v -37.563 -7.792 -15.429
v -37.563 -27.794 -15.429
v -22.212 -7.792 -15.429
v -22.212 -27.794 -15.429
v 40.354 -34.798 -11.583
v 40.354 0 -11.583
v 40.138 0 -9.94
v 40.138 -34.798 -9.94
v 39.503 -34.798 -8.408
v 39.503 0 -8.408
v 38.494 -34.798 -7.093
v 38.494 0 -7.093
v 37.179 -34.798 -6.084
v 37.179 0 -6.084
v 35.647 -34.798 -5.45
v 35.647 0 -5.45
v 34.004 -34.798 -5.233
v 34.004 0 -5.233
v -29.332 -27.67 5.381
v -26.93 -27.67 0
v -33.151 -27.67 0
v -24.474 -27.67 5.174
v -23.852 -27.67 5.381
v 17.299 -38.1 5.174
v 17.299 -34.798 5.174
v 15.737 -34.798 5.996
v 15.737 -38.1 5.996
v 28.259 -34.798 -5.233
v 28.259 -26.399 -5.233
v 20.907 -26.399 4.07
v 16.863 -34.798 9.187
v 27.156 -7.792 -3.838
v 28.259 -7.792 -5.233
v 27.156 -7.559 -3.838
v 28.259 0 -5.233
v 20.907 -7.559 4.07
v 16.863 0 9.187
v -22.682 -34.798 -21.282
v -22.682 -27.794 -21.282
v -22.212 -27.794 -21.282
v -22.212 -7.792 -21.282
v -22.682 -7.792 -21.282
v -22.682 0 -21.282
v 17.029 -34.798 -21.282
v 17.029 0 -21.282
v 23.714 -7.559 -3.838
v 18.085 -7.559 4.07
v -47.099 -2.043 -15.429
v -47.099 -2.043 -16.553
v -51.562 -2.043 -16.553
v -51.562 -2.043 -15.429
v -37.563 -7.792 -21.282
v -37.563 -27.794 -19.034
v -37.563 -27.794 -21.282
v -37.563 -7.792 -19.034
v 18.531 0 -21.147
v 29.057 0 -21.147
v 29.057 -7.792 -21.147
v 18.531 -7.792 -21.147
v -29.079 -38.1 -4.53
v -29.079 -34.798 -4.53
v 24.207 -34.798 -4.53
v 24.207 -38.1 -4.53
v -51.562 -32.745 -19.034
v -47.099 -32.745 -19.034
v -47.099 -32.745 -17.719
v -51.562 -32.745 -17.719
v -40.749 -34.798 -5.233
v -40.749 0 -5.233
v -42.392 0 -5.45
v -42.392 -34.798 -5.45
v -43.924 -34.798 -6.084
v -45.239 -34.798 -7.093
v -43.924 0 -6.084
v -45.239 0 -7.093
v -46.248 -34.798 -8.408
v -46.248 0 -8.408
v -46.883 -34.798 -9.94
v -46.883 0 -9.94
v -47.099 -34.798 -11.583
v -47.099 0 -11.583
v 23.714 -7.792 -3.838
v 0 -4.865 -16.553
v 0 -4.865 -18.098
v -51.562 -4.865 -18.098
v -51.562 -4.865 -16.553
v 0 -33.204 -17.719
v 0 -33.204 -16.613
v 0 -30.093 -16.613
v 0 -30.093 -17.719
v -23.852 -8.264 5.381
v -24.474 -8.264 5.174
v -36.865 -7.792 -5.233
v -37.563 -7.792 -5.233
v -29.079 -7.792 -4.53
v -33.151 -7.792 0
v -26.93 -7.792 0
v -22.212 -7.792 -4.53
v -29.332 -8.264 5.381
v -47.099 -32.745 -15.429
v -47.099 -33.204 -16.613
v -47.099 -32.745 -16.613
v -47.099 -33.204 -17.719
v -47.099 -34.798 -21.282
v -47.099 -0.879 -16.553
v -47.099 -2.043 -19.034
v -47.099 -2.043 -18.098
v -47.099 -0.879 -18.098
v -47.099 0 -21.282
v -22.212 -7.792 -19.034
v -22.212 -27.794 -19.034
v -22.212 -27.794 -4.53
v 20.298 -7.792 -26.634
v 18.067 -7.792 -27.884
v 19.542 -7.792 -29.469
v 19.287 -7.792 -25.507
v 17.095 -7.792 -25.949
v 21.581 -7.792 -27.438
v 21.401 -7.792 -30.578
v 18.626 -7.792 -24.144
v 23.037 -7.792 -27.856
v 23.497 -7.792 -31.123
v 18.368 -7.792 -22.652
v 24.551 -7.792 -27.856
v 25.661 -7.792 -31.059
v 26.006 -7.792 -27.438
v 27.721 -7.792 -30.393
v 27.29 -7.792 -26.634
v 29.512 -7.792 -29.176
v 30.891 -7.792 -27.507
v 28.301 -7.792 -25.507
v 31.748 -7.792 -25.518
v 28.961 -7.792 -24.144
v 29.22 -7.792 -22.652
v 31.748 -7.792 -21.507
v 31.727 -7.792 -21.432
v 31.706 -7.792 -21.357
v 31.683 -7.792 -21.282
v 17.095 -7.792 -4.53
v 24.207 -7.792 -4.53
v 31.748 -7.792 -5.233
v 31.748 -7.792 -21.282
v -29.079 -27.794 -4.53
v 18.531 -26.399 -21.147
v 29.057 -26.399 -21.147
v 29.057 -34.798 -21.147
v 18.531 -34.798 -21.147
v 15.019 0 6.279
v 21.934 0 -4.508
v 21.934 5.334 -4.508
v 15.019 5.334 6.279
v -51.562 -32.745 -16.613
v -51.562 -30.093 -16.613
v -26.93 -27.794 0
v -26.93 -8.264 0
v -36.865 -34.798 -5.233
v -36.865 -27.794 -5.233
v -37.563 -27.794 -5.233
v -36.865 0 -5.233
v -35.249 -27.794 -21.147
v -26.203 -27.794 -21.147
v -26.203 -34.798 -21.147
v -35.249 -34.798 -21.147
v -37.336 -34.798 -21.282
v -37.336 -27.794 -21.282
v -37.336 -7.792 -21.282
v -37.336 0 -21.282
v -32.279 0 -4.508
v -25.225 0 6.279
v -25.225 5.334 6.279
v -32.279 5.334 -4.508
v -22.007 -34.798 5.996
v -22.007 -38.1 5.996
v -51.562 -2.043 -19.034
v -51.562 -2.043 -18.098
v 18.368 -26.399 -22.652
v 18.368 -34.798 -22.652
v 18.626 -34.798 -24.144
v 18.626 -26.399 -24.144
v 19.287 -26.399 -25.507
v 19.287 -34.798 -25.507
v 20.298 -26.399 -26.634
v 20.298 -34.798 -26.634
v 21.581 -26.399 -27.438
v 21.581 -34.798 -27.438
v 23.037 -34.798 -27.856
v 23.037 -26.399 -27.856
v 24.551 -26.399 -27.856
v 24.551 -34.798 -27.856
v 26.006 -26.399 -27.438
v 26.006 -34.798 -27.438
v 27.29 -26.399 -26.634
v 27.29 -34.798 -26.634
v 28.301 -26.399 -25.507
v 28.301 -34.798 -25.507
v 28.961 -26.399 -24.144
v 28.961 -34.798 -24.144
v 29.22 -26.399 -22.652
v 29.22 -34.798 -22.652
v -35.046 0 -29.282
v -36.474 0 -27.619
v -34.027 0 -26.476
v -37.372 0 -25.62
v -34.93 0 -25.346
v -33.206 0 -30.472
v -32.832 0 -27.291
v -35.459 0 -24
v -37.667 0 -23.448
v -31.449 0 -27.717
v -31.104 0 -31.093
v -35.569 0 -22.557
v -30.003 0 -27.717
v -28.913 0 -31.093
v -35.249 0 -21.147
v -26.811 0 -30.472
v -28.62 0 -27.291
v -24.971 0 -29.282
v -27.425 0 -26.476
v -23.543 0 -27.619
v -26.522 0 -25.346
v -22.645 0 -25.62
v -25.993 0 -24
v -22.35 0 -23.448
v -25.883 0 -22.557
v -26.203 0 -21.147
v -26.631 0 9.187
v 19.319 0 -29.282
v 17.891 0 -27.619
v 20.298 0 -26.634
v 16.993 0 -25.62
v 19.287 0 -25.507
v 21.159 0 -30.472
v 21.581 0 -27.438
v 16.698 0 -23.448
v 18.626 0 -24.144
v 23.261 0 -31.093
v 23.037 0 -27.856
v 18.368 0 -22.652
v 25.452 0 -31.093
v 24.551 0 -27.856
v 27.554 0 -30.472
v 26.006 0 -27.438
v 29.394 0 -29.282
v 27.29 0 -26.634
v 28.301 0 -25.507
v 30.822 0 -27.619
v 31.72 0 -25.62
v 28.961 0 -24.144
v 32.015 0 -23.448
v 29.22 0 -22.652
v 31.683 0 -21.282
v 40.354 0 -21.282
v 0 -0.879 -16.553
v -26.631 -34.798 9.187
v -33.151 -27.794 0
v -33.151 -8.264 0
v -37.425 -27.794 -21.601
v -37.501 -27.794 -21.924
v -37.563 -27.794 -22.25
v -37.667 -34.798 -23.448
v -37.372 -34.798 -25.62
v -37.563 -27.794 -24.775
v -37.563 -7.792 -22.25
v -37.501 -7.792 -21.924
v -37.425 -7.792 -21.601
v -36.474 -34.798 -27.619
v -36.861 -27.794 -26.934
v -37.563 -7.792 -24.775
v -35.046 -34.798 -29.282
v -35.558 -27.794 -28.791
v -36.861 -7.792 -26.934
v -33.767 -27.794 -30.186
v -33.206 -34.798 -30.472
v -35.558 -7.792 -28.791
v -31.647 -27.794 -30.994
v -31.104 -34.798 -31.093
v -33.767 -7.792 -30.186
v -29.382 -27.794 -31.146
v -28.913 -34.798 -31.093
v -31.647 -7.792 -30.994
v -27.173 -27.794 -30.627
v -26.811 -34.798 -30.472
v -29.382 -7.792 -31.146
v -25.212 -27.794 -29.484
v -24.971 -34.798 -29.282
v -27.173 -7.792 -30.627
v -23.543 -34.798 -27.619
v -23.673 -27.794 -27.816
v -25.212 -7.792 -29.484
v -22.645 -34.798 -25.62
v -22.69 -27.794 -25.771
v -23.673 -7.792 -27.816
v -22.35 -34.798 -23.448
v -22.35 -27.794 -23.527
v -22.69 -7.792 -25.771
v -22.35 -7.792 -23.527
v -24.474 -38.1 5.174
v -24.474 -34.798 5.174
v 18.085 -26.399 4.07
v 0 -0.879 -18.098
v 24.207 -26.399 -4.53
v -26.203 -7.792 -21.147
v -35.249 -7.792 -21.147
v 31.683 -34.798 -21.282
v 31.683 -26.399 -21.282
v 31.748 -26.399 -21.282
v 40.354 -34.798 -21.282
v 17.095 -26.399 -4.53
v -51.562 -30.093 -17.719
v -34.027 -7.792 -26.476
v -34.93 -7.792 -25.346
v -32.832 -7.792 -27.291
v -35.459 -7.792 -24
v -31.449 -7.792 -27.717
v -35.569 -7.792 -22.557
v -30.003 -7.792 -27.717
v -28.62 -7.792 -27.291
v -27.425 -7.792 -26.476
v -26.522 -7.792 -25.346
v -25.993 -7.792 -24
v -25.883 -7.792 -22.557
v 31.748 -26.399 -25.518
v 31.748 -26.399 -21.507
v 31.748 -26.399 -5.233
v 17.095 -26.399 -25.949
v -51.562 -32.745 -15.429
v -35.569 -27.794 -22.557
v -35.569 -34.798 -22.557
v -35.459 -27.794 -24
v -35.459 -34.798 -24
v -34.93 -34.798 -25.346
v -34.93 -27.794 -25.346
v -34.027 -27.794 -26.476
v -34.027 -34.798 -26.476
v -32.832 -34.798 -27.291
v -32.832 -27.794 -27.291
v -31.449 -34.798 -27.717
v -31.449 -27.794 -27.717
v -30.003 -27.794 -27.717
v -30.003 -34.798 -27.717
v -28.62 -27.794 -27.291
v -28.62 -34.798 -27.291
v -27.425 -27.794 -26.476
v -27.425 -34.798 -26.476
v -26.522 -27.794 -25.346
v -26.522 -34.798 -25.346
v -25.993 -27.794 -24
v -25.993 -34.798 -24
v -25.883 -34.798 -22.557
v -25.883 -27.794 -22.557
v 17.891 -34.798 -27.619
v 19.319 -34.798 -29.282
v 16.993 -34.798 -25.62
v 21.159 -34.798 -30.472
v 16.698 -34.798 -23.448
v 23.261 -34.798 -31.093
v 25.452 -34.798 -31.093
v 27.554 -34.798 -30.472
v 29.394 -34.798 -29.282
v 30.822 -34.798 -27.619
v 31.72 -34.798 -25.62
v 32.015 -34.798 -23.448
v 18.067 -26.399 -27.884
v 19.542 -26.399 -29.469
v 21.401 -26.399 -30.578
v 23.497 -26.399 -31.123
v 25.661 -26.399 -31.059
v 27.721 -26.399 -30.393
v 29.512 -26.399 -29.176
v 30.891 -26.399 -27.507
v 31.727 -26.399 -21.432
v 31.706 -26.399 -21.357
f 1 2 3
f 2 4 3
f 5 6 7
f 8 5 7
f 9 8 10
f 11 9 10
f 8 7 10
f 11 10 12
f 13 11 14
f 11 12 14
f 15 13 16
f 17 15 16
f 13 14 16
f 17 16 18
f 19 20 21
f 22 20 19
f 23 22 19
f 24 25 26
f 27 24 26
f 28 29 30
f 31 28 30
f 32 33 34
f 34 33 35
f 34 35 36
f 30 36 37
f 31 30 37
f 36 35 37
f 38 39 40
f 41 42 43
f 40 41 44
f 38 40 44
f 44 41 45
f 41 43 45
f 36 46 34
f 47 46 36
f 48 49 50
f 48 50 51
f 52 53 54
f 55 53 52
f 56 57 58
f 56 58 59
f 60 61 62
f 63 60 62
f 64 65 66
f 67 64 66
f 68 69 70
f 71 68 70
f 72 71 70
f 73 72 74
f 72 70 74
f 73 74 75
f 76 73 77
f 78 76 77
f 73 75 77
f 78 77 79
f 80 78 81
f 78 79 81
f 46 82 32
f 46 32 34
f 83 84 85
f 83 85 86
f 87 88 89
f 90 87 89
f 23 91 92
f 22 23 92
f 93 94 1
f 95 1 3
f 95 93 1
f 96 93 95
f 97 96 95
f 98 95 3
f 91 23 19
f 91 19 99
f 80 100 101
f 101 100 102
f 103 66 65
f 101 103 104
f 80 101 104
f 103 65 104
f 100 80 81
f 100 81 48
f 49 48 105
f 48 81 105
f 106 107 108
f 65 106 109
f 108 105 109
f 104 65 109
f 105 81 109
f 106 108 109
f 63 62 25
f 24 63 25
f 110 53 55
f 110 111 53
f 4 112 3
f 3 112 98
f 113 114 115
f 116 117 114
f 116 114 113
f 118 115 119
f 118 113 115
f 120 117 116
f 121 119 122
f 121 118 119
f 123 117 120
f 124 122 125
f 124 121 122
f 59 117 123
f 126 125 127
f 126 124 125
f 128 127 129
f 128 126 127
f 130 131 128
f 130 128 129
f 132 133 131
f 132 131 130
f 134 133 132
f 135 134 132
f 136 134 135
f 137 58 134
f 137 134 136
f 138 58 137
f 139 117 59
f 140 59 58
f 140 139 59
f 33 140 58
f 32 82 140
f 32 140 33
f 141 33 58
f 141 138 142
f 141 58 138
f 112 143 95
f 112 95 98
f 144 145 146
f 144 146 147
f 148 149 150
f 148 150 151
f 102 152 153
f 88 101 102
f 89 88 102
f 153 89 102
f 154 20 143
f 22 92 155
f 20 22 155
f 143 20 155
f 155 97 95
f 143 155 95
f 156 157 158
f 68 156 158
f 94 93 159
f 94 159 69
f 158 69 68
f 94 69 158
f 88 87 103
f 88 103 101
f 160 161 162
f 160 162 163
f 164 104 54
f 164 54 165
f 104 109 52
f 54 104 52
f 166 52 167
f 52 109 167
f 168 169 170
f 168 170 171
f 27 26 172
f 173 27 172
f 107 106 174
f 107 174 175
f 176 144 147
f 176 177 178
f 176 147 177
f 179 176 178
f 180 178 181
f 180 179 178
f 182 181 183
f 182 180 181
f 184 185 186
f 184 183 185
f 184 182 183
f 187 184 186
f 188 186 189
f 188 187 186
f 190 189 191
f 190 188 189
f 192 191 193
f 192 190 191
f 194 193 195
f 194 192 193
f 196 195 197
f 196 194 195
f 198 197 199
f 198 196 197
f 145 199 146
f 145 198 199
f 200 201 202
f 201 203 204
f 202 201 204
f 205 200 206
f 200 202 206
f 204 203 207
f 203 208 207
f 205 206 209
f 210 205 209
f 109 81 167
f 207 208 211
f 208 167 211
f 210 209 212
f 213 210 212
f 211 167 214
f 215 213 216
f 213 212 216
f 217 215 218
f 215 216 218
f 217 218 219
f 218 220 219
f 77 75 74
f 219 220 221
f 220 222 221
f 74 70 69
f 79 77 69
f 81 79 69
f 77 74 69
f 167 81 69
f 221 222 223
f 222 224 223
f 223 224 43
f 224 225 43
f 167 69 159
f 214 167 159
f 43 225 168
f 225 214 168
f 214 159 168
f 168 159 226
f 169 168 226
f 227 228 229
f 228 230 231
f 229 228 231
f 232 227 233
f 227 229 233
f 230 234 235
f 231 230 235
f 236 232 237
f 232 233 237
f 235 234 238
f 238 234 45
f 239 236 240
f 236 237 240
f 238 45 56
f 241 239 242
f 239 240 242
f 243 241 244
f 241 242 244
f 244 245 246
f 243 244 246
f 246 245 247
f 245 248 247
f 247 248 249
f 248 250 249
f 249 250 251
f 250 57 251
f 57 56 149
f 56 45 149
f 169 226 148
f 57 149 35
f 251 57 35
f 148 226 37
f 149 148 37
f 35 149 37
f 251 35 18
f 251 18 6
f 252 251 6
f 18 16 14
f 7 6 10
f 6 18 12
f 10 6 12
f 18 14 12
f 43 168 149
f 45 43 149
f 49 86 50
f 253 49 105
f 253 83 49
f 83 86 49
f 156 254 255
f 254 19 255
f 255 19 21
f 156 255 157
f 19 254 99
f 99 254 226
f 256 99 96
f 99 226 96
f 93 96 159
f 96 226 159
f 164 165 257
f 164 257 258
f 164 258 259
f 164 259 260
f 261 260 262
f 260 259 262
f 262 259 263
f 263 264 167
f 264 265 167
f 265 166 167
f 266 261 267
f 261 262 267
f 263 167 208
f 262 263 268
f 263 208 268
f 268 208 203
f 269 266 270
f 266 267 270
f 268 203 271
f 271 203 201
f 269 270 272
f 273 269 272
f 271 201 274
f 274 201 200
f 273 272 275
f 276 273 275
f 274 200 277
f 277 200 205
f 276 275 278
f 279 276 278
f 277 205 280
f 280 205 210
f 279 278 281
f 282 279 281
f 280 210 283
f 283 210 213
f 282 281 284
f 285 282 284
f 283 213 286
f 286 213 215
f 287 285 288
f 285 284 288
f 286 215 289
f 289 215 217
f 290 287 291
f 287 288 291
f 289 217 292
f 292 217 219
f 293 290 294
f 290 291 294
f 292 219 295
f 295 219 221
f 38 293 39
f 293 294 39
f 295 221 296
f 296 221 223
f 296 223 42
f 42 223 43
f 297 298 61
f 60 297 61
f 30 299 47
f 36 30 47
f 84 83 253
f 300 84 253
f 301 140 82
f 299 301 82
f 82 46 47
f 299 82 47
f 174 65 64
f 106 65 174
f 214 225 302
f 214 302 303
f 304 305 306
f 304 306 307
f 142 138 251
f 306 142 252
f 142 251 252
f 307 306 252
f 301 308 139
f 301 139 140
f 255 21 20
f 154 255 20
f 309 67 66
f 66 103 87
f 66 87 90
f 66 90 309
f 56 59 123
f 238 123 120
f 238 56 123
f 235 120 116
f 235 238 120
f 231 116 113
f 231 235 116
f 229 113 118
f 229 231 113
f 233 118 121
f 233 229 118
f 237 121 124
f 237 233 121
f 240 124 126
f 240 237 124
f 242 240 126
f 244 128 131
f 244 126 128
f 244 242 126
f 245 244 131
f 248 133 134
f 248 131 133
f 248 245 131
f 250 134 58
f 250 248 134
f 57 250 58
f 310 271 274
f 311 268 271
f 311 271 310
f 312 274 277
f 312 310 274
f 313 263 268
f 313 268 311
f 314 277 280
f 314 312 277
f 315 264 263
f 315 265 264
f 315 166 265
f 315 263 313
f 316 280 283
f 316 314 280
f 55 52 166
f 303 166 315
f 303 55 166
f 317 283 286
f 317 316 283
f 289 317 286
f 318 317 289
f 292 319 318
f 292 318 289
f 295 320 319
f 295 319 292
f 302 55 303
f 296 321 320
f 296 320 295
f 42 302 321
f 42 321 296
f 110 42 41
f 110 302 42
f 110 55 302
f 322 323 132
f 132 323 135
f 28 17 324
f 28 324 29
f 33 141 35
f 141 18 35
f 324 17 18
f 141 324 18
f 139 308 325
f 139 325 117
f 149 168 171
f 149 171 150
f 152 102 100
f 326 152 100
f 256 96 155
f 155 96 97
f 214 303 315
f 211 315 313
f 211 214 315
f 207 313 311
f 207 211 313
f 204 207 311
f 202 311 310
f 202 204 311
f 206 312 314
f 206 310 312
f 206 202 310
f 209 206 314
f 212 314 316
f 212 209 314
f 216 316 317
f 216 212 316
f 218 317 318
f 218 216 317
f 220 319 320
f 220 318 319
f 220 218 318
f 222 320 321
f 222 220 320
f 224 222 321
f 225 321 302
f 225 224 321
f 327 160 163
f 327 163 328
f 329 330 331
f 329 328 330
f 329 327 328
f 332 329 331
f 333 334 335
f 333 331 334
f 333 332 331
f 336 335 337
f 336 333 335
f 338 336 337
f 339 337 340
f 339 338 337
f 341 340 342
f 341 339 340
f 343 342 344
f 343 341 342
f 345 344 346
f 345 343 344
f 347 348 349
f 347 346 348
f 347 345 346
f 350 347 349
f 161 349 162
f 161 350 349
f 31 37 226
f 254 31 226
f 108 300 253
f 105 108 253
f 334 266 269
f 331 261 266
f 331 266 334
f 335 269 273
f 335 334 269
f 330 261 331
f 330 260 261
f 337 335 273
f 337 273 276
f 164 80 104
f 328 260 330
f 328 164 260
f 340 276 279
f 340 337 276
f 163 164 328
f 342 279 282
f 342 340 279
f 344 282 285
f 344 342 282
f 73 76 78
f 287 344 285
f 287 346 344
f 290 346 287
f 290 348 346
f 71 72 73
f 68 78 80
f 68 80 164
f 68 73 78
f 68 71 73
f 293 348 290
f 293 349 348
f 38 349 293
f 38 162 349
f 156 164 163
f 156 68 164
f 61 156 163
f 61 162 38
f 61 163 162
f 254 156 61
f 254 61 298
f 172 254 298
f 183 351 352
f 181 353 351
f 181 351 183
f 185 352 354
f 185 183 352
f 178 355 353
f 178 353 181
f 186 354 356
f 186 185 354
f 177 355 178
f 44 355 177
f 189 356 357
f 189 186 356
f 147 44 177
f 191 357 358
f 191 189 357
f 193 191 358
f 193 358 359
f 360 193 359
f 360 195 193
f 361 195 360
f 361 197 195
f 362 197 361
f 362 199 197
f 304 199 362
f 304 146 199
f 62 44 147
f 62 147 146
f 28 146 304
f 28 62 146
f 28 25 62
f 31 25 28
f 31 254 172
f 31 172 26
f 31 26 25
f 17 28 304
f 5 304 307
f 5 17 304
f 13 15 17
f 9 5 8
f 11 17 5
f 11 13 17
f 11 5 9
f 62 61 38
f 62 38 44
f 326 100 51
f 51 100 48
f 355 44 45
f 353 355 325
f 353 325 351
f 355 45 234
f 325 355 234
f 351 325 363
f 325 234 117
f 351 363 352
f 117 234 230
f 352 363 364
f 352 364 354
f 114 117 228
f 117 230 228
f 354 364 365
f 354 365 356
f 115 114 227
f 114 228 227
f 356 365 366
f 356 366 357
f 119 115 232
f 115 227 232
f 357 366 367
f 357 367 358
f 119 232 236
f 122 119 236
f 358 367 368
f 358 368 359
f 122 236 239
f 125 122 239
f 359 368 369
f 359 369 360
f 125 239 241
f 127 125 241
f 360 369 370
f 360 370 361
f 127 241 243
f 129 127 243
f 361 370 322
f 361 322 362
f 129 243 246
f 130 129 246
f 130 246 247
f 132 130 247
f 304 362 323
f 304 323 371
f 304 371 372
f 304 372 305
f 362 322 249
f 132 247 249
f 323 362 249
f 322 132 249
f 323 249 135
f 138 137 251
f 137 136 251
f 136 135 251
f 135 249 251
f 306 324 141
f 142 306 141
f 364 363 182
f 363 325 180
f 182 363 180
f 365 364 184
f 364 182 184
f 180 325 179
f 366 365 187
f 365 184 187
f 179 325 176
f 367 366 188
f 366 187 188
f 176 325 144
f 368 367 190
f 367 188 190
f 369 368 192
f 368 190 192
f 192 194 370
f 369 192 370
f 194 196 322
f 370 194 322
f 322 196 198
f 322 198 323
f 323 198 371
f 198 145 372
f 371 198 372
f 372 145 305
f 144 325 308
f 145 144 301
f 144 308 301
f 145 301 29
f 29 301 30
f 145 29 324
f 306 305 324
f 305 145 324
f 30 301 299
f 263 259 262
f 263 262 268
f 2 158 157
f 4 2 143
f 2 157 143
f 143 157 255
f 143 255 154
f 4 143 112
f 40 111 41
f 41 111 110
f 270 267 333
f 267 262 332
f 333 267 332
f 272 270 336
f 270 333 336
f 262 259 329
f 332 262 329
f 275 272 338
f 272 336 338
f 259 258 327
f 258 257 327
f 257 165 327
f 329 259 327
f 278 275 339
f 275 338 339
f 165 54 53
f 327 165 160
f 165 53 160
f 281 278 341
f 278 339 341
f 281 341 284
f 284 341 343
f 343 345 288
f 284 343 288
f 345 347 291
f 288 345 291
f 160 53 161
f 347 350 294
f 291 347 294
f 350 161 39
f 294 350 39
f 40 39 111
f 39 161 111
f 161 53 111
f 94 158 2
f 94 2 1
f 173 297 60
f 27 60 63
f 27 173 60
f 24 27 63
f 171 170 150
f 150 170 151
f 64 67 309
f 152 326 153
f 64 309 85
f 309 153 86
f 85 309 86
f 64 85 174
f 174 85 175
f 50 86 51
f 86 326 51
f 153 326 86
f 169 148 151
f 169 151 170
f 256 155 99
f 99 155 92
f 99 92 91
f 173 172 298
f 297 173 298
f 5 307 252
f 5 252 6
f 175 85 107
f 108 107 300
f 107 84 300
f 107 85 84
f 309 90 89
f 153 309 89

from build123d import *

# Parameters (mm, degrees)
F1_DEPTH  = 34.798
F2_W      = 14.652997
F2_H      = 18.606977
F2_W_2    = 15.350757
F2_H_2    = 20.002499
F3_DEPTH  = 33.02
F4_W      = 19.40675
F4_H      = 9.867839
F5_DEPTH  = 230.124
F6_W      = 18.839565
F6_H      = 7.907965
F7_DEPTH  = 125.476
F9_DEPTH  = 83.566
F11_DEPTH = 38.1
F13_DEPTH = 5.334
F14_W     = 30.701512
F14_H     = 3.605101
F15_DEPTH = 51.562
F16_W     = 3.986457
F16_H     = 1.545359
F17_DEPTH = 90.932
F18_W     = 3.111688
F18_H     = 1.106378
F19_DEPTH = 112.1664


with BuildPart() as f1:
    # F0 (on Front) → F1 (new body)
    with BuildSketch(Plane.XZ):
        Polygon((-26.631236, 9.187195), (-36.865074, -5.233212), (28.259346, -5.233212), (16.862571, 9.187195), align=None)
        with BuildLine():
            Line((-36.865074, -5.233212), (-40.748909, -5.233212))
            ThreePointArc((-40.748909, -5.233212), (-45.239037, -7.093084), (-47.098909, -11.583212))
            Line((-47.098909, -11.583212), (-47.098909, -21.28173))
            Line((-47.098909, -21.28173), (-37.335627, -21.28173))
            ThreePointArc((-37.335627, -21.28173), (-30.008619, -31.171456), (-22.681611, -21.28173))
            Line((-22.681611, -21.28173), (17.029377, -21.28173))
            ThreePointArc((17.029377, -21.28173), (24.356385, -31.171456), (31.683393, -21.28173))
            Line((31.683393, -21.28173), (40.353883, -21.28173))
            Line((40.353883, -21.28173), (40.353883, -11.583212))
            ThreePointArc((40.353883, -11.583212), (38.494011, -7.093084), (34.003883, -5.233212))
            Line((34.003883, -5.233212), (28.259346, -5.233212))
            Line((28.259346, -5.233212), (-36.865074, -5.233212))
        make_face()
    extrude(amount=F1_DEPTH)

    # F2 (on Top) → F3 (cut)
    with BuildSketch(Plane.XY):
        with Locations((24.421658, -17.09516)):
            Rectangle(F2_W, F2_H)
        with Locations((-29.887457, -17.792921)):
            Rectangle(F2_W_2, F2_H_2)
    extrude(amount=-F3_DEPTH, mode=Mode.SUBTRACT)

    # F4 (on Right) → F5 (cut)
    with BuildSketch(Plane.YZ):
        with Locations((-17.967003, 0.447439)):
            Rectangle(F4_W, F4_H)
    extrude(amount=-F5_DEPTH, mode=Mode.SUBTRACT)

    # F6 (on Right) → F7 (cut)
    with BuildSketch(Plane.YZ):
        with Locations((-16.978866, 0.116294)):
            Rectangle(F6_W, F6_H)
    extrude(amount=F7_DEPTH, mode=Mode.SUBTRACT)

    # F8 (on Front) → F9 (cut)
    with BuildSketch(Plane.XZ):
        with BuildLine():
            Line((-26.203193, -21.146845), (-35.248715, -21.146845))
            ThreePointArc((-35.248715, -21.146845), (-30.725954, -27.770875), (-26.203193, -21.146845))
        make_face()
        with BuildLine():
            ThreePointArc((18.531013, -21.146845), (23.793861, -27.908914), (29.056709, -21.146845))
            Line((29.056709, -21.146845), (18.531013, -21.146845))
        make_face()
    extrude(amount=F9_DEPTH, mode=Mode.SUBTRACT)

    # F10 (on Front) → F11 (join)
    with BuildSketch(Plane.XZ):
        Polygon((-24.474356, 5.173787), (-29.079348, -4.529587), (24.206989, -4.529587), (17.299499, 5.173787), (15.737092, 5.996108), (-22.007396, 5.996108), align=None)
    extrude(amount=F11_DEPTH)

    # F12 (on Front) → F13 (join)
    with BuildSketch(Plane.XZ):
        Polygon((21.933926, -4.508358), (15.019068, 6.278823), (-25.225412, 6.278823), (-32.278571, -4.508358), align=None)
    extrude(amount=-F13_DEPTH)

    # F14 (on Right) → F15 (join)
    with BuildSketch(Plane.YZ):
        with Locations((-17.393864, -17.231901)):
            Rectangle(F14_W, F14_H)
    extrude(amount=-F15_DEPTH)

    # F16 (on Right) → F17 (cut)
    with BuildSketch(Plane.YZ):
        with Locations((-2.872, -17.325192)):
            Rectangle(F16_W, F16_H)
    extrude(amount=-F17_DEPTH, mode=Mode.SUBTRACT)

    # F18 (on Right) → F19 (cut)
    with BuildSketch(Plane.YZ):
        with Locations((-31.648566, -17.165717)):
            Rectangle(F18_W, F18_H)
    extrude(amount=-F19_DEPTH, mode=Mode.SUBTRACT)


solid = f1.part
